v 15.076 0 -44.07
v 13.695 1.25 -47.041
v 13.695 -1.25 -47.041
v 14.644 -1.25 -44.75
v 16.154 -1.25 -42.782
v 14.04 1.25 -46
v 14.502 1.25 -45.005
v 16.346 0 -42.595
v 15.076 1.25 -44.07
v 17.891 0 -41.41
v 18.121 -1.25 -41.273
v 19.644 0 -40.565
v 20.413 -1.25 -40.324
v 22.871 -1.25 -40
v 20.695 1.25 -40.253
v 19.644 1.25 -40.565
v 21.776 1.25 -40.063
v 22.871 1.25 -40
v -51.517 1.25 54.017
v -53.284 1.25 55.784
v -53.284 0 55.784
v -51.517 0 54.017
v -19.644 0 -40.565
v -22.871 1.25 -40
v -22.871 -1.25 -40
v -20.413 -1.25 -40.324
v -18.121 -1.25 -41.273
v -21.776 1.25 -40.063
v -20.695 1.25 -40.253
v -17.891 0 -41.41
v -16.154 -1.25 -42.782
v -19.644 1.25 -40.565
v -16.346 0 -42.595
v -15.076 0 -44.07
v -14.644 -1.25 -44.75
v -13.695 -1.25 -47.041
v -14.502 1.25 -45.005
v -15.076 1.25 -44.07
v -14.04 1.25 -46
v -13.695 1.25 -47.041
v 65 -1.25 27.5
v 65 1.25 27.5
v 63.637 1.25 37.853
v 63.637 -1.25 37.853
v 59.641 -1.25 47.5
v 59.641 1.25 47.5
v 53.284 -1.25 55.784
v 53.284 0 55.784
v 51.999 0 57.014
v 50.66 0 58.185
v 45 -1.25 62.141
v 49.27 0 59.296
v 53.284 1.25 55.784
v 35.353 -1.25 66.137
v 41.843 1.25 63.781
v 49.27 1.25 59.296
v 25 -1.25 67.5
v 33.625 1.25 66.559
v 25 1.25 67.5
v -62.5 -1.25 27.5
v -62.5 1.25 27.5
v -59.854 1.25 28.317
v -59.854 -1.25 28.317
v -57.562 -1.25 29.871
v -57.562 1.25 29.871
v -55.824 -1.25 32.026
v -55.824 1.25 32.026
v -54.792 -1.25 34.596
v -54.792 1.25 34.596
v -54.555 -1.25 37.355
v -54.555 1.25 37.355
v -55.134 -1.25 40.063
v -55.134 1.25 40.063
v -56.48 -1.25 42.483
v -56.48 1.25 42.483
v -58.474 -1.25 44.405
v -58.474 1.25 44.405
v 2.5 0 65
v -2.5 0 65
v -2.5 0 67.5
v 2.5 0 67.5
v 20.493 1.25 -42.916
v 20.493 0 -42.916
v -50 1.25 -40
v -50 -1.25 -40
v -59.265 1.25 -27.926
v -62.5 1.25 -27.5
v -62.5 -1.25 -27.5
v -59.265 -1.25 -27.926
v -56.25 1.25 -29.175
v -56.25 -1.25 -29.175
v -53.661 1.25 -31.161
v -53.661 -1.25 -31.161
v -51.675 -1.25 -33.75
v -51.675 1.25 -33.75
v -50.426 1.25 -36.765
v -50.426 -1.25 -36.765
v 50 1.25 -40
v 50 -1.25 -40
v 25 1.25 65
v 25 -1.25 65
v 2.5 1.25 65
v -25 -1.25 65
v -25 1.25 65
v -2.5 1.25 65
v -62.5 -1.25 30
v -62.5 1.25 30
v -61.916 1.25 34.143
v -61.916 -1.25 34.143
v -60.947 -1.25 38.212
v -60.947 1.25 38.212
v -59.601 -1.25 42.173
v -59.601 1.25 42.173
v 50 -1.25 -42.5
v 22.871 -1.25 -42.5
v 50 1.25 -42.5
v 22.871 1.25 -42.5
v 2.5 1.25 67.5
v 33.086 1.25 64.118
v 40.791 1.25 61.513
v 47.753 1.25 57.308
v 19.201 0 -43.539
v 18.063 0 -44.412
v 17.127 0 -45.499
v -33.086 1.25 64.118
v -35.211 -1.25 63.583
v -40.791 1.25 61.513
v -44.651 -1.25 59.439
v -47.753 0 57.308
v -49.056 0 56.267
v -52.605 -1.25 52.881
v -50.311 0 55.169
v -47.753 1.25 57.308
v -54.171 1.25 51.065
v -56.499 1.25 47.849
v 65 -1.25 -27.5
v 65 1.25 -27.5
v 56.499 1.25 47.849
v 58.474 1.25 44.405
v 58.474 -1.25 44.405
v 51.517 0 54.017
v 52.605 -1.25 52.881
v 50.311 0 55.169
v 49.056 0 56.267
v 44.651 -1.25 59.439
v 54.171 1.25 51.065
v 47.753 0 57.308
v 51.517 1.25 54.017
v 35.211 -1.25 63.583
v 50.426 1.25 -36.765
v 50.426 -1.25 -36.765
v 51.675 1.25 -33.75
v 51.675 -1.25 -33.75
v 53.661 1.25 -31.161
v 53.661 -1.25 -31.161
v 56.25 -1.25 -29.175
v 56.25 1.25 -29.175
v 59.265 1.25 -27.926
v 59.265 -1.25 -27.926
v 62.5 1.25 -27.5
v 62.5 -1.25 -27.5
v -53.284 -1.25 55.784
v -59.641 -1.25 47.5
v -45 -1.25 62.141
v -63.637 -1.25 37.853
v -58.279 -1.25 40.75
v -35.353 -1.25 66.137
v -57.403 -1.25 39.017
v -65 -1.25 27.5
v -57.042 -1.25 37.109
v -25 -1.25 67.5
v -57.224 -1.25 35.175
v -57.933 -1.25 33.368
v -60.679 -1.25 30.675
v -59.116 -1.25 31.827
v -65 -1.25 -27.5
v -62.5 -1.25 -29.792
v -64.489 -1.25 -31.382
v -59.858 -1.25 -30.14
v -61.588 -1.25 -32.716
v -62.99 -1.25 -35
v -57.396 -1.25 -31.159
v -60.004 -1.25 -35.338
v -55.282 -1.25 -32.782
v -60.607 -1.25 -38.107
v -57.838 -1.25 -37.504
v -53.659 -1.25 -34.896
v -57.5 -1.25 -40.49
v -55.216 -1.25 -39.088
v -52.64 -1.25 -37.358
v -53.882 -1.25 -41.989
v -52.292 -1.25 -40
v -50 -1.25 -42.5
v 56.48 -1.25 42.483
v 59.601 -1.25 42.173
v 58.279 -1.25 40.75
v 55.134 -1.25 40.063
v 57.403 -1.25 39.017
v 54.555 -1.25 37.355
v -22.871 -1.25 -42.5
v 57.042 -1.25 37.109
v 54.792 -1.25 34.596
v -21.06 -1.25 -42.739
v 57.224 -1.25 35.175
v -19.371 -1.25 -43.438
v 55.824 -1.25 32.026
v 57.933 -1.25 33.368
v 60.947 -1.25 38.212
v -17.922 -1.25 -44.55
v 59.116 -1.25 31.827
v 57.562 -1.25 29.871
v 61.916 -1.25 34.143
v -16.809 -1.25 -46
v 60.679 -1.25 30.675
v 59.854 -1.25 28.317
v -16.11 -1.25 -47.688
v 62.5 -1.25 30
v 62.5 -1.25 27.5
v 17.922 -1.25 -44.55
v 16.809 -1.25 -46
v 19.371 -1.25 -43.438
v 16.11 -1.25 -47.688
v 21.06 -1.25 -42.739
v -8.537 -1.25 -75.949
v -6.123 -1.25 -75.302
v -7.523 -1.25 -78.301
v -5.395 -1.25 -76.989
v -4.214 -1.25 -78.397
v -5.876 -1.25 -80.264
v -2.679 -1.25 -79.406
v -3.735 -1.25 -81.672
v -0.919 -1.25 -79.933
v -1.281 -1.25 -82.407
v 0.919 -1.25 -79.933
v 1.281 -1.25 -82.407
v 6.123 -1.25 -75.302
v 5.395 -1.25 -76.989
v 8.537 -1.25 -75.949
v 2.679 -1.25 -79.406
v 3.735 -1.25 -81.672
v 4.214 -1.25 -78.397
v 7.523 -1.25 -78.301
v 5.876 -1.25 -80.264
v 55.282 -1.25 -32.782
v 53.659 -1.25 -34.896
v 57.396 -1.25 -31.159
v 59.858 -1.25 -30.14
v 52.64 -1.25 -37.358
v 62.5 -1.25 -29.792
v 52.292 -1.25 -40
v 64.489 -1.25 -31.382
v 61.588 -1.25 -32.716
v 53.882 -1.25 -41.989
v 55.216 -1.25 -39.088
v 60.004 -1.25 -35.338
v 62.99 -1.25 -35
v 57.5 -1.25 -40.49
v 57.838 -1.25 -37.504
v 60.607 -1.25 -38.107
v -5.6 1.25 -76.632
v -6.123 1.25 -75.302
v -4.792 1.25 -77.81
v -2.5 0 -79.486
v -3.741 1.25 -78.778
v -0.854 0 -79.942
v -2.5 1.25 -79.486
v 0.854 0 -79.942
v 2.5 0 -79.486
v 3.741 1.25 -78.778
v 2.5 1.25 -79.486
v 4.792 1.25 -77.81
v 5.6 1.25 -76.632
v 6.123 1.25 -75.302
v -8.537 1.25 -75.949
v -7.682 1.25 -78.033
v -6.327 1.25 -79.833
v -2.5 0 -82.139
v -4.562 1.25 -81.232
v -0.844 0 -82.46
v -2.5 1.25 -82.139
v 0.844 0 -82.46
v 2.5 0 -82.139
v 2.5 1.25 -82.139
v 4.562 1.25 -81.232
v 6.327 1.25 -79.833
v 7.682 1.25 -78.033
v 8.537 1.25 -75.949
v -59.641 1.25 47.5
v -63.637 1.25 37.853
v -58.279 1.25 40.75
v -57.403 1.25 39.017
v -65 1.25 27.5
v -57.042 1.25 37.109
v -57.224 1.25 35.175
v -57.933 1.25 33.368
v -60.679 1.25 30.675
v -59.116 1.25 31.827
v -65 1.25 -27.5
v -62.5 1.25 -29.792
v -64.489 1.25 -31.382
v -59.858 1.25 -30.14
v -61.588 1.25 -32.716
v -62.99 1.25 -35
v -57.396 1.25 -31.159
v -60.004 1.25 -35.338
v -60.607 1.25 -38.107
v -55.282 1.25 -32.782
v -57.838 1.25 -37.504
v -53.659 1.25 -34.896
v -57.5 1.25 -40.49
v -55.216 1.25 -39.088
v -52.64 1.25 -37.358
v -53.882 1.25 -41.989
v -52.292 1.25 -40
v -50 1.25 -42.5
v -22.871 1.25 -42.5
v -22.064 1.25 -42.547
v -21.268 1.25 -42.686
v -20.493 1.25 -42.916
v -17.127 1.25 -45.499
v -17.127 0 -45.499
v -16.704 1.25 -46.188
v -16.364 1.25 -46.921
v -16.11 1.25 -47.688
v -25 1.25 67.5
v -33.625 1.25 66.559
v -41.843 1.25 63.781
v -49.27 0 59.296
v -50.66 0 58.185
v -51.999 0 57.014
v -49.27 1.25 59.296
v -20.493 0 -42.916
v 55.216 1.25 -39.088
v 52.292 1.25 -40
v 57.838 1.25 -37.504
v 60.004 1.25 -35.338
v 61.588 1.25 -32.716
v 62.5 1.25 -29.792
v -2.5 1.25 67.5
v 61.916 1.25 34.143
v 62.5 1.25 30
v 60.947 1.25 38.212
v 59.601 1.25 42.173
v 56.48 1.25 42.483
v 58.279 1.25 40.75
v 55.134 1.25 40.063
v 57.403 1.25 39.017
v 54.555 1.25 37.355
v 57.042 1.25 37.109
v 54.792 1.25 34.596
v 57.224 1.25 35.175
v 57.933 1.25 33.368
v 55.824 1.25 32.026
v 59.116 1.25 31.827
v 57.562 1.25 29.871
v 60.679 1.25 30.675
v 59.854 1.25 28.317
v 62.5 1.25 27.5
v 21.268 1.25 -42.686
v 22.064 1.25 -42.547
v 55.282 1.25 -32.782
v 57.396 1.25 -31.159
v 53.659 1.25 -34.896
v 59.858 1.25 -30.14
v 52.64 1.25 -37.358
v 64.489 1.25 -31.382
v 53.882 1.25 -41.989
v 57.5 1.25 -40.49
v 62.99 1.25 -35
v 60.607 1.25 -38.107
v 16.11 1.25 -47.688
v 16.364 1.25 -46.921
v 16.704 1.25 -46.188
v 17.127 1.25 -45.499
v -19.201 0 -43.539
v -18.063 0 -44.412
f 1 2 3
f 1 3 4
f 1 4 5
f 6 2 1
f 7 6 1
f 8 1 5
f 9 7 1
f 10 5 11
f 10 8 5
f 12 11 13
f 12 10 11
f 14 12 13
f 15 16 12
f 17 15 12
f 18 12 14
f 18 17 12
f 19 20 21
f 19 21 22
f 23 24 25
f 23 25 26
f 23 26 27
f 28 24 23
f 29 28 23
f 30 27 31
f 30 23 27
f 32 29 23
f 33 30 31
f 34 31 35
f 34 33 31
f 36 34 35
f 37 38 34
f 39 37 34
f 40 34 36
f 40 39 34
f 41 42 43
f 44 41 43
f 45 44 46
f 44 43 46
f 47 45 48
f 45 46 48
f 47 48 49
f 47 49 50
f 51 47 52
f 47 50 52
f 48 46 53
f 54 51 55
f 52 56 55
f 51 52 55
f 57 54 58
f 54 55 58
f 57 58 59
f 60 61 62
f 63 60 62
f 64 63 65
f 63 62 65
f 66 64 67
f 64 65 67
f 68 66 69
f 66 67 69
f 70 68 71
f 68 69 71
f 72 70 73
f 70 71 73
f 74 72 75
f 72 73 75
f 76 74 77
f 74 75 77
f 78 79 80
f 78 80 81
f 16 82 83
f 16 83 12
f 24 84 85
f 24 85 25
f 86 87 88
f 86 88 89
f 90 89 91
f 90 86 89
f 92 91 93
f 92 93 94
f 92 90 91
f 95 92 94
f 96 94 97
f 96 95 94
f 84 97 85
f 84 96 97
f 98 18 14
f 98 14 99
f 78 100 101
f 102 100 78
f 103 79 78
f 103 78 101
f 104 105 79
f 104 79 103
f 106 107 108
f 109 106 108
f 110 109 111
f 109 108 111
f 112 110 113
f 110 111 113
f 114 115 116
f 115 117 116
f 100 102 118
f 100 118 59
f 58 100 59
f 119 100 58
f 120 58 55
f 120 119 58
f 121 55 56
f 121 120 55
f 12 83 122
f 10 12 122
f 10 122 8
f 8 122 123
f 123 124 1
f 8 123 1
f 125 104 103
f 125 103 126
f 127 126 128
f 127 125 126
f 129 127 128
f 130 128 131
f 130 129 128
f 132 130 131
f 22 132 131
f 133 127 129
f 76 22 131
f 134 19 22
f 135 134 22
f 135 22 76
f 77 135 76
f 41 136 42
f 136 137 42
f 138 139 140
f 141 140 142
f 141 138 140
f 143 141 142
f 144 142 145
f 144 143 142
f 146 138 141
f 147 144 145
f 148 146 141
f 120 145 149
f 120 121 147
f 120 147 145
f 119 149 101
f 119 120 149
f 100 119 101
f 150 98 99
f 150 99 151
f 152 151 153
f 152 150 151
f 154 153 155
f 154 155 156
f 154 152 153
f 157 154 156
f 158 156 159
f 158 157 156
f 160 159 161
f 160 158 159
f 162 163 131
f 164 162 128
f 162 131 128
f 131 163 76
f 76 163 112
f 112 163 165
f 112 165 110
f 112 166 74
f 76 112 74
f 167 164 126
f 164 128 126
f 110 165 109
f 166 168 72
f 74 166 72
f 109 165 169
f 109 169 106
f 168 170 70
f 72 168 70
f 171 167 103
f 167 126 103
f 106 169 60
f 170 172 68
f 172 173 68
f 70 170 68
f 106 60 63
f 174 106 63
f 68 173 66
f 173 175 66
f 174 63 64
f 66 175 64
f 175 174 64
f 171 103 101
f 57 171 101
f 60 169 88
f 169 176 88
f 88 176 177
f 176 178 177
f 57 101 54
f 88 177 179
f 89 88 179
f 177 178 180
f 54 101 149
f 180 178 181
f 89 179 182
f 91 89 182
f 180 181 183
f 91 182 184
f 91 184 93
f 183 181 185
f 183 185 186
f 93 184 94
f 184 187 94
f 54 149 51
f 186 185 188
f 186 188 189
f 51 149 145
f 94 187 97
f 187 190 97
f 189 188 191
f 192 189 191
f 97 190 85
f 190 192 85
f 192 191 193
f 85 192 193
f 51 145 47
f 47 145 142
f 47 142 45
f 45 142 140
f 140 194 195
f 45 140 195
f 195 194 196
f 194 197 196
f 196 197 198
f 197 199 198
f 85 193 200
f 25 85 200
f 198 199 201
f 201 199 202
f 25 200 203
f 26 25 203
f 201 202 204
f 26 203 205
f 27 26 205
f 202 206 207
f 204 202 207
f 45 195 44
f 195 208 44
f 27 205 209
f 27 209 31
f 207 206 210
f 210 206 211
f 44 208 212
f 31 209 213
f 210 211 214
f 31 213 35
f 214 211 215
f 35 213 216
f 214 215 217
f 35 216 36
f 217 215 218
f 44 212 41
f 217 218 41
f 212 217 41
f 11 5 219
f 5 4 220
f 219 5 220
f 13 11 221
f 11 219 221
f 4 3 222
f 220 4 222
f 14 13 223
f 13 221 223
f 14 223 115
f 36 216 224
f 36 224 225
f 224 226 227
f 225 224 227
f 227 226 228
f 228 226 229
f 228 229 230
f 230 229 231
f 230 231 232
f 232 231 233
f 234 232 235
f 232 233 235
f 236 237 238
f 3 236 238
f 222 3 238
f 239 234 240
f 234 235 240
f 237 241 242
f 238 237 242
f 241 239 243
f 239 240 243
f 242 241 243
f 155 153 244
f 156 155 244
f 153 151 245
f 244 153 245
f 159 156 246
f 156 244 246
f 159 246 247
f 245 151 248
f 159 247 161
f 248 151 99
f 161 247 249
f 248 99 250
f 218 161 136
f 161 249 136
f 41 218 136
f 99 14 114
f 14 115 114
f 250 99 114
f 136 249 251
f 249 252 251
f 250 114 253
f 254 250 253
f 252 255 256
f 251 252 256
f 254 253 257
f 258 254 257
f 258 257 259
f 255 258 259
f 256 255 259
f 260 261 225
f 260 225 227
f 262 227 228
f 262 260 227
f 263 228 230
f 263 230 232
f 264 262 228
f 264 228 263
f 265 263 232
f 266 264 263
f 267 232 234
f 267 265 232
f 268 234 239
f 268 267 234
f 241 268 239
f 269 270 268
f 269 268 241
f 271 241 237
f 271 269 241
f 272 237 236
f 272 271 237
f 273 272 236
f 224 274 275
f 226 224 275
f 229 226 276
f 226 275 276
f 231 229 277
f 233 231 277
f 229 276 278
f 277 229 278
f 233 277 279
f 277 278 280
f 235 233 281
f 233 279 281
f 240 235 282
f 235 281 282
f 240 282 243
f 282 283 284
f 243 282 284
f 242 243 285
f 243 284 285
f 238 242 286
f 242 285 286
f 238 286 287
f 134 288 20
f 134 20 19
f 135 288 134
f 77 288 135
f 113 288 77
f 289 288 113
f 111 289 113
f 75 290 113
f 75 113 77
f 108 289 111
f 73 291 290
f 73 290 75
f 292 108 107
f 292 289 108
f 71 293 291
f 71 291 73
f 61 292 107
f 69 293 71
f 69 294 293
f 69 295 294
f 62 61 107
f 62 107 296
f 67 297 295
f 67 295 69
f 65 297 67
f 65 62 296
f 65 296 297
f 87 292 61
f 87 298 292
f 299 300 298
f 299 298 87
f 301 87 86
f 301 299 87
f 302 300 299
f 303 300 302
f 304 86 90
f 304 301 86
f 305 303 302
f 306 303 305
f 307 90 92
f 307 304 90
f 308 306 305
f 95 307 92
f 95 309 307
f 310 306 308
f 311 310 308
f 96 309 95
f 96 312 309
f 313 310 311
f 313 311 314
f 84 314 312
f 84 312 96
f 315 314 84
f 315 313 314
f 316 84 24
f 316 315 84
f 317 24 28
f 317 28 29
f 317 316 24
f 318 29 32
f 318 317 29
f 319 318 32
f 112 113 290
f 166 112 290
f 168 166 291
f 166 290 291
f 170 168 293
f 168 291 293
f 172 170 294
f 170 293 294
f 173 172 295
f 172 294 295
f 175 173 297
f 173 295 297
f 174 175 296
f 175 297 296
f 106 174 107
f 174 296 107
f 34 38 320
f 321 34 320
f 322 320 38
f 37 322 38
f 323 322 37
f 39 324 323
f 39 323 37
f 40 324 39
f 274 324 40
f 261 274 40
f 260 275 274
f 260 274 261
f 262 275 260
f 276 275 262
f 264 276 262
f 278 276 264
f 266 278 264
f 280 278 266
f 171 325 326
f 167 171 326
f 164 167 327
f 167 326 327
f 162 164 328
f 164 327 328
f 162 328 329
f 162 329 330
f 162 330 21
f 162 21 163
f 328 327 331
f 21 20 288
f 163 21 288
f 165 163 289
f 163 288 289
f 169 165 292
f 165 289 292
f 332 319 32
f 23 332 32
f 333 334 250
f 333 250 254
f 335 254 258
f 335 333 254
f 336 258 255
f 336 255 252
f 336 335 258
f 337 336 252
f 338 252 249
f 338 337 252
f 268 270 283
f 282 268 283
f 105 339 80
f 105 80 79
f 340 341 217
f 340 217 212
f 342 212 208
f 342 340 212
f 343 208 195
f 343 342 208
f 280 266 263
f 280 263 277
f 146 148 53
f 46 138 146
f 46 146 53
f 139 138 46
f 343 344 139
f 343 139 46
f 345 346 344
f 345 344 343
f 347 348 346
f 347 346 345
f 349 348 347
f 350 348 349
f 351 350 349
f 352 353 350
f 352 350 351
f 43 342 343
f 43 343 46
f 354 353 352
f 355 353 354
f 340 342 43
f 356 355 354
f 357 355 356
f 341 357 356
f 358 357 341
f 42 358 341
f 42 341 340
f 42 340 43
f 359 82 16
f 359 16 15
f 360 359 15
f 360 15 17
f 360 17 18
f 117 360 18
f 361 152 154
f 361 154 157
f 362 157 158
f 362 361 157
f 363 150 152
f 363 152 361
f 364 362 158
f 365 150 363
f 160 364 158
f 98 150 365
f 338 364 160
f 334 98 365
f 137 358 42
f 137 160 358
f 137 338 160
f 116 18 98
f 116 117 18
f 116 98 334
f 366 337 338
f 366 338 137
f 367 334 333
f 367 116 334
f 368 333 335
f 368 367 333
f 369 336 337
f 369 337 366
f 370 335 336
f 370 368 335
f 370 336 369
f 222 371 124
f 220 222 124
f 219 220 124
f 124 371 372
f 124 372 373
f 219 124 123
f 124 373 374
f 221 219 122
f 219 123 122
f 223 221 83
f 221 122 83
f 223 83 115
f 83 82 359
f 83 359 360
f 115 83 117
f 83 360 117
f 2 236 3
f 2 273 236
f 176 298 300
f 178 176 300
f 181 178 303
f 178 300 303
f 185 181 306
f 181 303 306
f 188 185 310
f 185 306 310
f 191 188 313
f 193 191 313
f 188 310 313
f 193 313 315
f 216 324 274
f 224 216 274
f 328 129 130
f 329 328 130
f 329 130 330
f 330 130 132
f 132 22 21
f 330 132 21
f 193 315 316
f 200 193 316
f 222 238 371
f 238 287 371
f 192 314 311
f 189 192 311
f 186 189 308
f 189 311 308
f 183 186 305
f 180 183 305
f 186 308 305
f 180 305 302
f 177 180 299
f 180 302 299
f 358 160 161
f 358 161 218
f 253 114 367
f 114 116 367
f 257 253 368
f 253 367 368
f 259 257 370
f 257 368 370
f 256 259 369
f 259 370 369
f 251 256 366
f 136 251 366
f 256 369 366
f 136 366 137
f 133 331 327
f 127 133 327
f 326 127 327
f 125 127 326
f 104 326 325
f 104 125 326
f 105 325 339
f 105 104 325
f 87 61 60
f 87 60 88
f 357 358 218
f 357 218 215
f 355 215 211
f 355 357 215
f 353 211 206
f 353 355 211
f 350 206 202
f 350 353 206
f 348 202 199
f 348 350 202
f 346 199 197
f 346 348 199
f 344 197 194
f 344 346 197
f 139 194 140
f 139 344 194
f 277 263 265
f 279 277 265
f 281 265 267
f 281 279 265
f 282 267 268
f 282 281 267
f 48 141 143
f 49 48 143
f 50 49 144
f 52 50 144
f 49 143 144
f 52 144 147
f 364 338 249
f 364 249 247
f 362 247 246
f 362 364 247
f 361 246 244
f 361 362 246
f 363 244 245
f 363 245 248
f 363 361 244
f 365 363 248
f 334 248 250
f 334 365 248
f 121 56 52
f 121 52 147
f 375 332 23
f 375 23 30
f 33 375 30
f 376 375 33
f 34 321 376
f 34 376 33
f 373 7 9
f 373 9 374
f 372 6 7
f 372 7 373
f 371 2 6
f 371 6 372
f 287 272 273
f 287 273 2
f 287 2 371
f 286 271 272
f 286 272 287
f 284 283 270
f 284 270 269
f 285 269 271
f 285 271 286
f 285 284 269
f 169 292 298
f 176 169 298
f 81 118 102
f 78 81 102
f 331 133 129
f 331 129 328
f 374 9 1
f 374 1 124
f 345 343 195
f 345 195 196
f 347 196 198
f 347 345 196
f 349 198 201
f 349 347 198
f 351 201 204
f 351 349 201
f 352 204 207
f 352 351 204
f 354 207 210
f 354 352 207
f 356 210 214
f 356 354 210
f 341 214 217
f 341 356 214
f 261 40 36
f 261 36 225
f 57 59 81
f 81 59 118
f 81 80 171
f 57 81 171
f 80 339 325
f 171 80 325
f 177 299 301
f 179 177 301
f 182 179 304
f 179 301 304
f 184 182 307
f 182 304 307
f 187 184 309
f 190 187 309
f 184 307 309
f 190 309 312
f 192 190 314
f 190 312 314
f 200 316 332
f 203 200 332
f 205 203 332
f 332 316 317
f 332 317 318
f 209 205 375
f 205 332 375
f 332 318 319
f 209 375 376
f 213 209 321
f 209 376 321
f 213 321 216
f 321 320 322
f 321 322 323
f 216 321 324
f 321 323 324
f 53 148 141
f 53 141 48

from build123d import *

# Parameters (mm, degrees)
BOSS_EXTRUDE1_DEPTH = 1.25
BOSS_EXTRUDE5_DEPTH = 2.5
SKETCH6_W           = 5
SKETCH6_H           = 4
CUT_EXTRUDE1_DEPTH  = 1.25
CUT_EXTRUDE2_DEPTH  = 2.5


with BuildPart() as part:
    # Sketch2 → Boss-Extrude1 (new body, symmetric)
    with BuildSketch(Plane(origin=(0, 0, 0), x_dir=(1, 0, 0), z_dir=(0, 1, 0))):
        with BuildLine():
            Line((-16.109808132, 47.688266684), (-8.537351427, 75.949059844))
            ThreePointArc((-8.537351427, 75.949059844), (0, 82.5), (8.537351427, 75.949059844))
            Line((8.537351427, 75.949059844), (16.109808132, 47.688266684))
            ThreePointArc((16.109808132, 47.688266684), (18.609958913, 43.946526618), (22.871288916, 42.5))
            Line((22.871288916, 42.5), (50, 42.5))
            ThreePointArc((50, 42.5), (60.606601718, 38.106601718), (65, 27.5))
            Line((65, 27.5), (65, -27.5))
            ThreePointArc((65, -27.5), (53.284271247, -55.784271247), (25, -67.5))
            Line((25, -67.5), (-25, -67.5))
            ThreePointArc((-25, -67.5), (-53.284271247, -55.784271247), (-65, -27.5))
            Line((-65, -27.5), (-65, 27.5))
            ThreePointArc((-65, 27.5), (-60.606601718, 38.106601718), (-50, 42.5))
            Line((-50, 42.5), (-22.871288916, 42.5))
            ThreePointArc((-22.871288916, 42.5), (-18.609958913, 43.946526618), (-16.109808132, 47.688266684))
        make_face()
        with BuildLine():
            Line((6.122536861, 75.302012231), (13.694993566, 47.041219072))
            ThreePointArc((13.694993566, 47.041219072), (17.08805534, 41.963143267), (22.871288916, 40))
            Line((22.871288916, 40), (50, 40))
            ThreePointArc((50, 40), (58.838834765, 36.338834765), (62.5, 27.5))
            Line((62.5, 27.5), (62.5, -27.5))
            ThreePointArc((62.5, -27.5), (51.516504294, -54.016504294), (25, -65))
            Line((25, -65), (-25, -65))
            ThreePointArc((-25, -65), (-51.516504294, -54.016504294), (-62.5, -27.5))
            Line((-62.5, -27.5), (-62.5, 27.5))
            ThreePointArc((-62.5, 27.5), (-58.838834765, 36.338834765), (-50, 40))
            Line((-50, 40), (-22.871288916, 40))
            ThreePointArc((-22.871288916, 40), (-17.08805534, 41.963143267), (-13.694993566, 47.041219072))
            Line((-13.694993566, 47.041219072), (-6.122536861, 75.302012231))
            ThreePointArc((-6.122536861, 75.302012231), (0, 80), (6.122536861, 75.302012231))
        make_face(mode=Mode.SUBTRACT)
    extrude(amount=BOSS_EXTRUDE1_DEPTH, both=True)

    # Sketch5 → Boss-Extrude5 (add)
    with BuildSketch(Plane(origin=(0, 1.25, 0), x_dir=(1, 0, 0), z_dir=(0, 1, 0))):
        with BuildLine():
            ThreePointArc((-62.5, 27.5), (-53.661165235, 31.161165235), (-50, 40))
            ThreePointArc((-50, 40), (-58.838834765, 36.338834765), (-62.5, 27.5))
        make_face()
        with BuildLine():
            ThreePointArc((50, 40), (53.661165235, 31.161165235), (62.5, 27.5))
            ThreePointArc((62.5, 27.5), (58.838834765, 36.338834765), (50, 40))
        make_face()
        with BuildLine():
            ThreePointArc((-62.5, -27.5), (-54.791585286, -34.595919329), (-58.473512014, -44.404851181))
            ThreePointArc((-58.473512014, -44.404851181), (-61.479492188, -36.188880811), (-62.5, -27.5))
        make_face()
        with BuildLine():
            ThreePointArc((62.5, -27.5), (54.791585286, -34.595919329), (58.473512014, -44.404851181))
            ThreePointArc((58.473512014, -44.404851181), (61.479492187, -36.188880811), (62.5, -27.5))
        make_face()
    extrude(amount=-BOSS_EXTRUDE5_DEPTH)

    # Sketch6 → Cut-Extrude1 (cut)
    with BuildSketch(Plane(origin=(0, 1.25, 0), x_dir=(1, 0, 0), z_dir=(0, 1, 0))):
        with Locations((0, 81.25)):
            Rectangle(SKETCH6_W, SKETCH6_H)
        with BuildLine():
            Line((-20.493193447, 42.916333701), (-19.643873637, 40.565024308))
            ThreePointArc((-19.643873637, 40.565024308), (-17.08805534, 41.963143267), (-15.076081678, 44.070014354))
            Line((-15.076081678, 44.070014354), (-17.127452004, 45.498957945))
            ThreePointArc((-17.127452004, 45.498957945), (-18.609958913, 43.946526618), (-20.493193447, 42.916333701))
        make_face()
        with BuildLine():
            Line((20.493193447, 42.916333701), (19.643873637, 40.565024308))
            ThreePointArc((19.643873637, 40.565024308), (17.08805534, 41.963143267), (15.076081678, 44.070014354))
            Line((15.076081678, 44.070014354), (17.127452004, 45.498957945))
            ThreePointArc((17.127452004, 45.498957945), (18.609958913, 43.946526618), (20.493193447, 42.916333701))
        make_face()
        with BuildLine():
            Line((-53.284271247, -55.784271247), (-51.516504294, -54.016504294))
            ThreePointArc((-51.516504294, -54.016504294), (-49.689746158, -55.725280064), (-47.753133619, -57.308470449))
            Line((-47.753133619, -57.308470449), (-49.270009194, -59.295701812))
            ThreePointArc((-49.270009194, -59.295701812), (-51.335729235, -57.606965401), (-53.284271247, -55.784271247))
        make_face()
        with BuildLine():
            Line((49.270009194, -59.295701812), (47.753133619, -57.308470449))
            ThreePointArc((47.753133619, -57.308470449), (49.689746158, -55.725280064), (51.516504294, -54.016504294))
            Line((51.516504294, -54.016504294), (53.284271247, -55.784271247))
            ThreePointArc((53.284271247, -55.784271247), (51.335729235, -57.606965401), (49.270009194, -59.295701812))
        make_face()
        with Locations((0, -66.5)):
            Rectangle(SKETCH6_W, SKETCH6_H)
    extrude(amount=-CUT_EXTRUDE1_DEPTH, mode=Mode.SUBTRACT)

    # Sketch7 → Cut-Extrude2 (cut)
    with BuildSketch(Plane(origin=(0, 1.25, 0), x_dir=(1, 0, 0), z_dir=(0, 1, 0))):
        with BuildLine():
            ThreePointArc((-62.5, 29.791666667), (-55.281618275, 32.781618275), (-52.291666667, 40))
            ThreePointArc((-52.291666667, 40), (-58.986148678, 36.486148678), (-62.5, 29.791666667))
        make_face()
        with BuildLine():
            ThreePointArc((52.291666667, 40), (58.986148678, 36.486148678), (62.5, 29.791666667))
            ThreePointArc((62.5, 29.791666667), (55.281618275, 32.781618275), (52.291666667, 40))
        make_face()
        with BuildLine():
            ThreePointArc((-59.600502093, -42.173283714), (-57.223551432, -35.175178049), (-62.5, -30))
            ThreePointArc((-62.5, -30), (-61.479492188, -36.188880811), (-59.600502093, -42.173283714))
        make_face()
        with BuildLine():
            ThreePointArc((62.5, -30), (61.479492187, -36.188880811), (59.600502093, -42.173283714))
            ThreePointArc((59.600502093, -42.173283714), (57.223551432, -35.175178049), (62.5, -30))
        make_face()
    extrude(amount=-CUT_EXTRUDE2_DEPTH, mode=Mode.SUBTRACT)


solid = part.part
